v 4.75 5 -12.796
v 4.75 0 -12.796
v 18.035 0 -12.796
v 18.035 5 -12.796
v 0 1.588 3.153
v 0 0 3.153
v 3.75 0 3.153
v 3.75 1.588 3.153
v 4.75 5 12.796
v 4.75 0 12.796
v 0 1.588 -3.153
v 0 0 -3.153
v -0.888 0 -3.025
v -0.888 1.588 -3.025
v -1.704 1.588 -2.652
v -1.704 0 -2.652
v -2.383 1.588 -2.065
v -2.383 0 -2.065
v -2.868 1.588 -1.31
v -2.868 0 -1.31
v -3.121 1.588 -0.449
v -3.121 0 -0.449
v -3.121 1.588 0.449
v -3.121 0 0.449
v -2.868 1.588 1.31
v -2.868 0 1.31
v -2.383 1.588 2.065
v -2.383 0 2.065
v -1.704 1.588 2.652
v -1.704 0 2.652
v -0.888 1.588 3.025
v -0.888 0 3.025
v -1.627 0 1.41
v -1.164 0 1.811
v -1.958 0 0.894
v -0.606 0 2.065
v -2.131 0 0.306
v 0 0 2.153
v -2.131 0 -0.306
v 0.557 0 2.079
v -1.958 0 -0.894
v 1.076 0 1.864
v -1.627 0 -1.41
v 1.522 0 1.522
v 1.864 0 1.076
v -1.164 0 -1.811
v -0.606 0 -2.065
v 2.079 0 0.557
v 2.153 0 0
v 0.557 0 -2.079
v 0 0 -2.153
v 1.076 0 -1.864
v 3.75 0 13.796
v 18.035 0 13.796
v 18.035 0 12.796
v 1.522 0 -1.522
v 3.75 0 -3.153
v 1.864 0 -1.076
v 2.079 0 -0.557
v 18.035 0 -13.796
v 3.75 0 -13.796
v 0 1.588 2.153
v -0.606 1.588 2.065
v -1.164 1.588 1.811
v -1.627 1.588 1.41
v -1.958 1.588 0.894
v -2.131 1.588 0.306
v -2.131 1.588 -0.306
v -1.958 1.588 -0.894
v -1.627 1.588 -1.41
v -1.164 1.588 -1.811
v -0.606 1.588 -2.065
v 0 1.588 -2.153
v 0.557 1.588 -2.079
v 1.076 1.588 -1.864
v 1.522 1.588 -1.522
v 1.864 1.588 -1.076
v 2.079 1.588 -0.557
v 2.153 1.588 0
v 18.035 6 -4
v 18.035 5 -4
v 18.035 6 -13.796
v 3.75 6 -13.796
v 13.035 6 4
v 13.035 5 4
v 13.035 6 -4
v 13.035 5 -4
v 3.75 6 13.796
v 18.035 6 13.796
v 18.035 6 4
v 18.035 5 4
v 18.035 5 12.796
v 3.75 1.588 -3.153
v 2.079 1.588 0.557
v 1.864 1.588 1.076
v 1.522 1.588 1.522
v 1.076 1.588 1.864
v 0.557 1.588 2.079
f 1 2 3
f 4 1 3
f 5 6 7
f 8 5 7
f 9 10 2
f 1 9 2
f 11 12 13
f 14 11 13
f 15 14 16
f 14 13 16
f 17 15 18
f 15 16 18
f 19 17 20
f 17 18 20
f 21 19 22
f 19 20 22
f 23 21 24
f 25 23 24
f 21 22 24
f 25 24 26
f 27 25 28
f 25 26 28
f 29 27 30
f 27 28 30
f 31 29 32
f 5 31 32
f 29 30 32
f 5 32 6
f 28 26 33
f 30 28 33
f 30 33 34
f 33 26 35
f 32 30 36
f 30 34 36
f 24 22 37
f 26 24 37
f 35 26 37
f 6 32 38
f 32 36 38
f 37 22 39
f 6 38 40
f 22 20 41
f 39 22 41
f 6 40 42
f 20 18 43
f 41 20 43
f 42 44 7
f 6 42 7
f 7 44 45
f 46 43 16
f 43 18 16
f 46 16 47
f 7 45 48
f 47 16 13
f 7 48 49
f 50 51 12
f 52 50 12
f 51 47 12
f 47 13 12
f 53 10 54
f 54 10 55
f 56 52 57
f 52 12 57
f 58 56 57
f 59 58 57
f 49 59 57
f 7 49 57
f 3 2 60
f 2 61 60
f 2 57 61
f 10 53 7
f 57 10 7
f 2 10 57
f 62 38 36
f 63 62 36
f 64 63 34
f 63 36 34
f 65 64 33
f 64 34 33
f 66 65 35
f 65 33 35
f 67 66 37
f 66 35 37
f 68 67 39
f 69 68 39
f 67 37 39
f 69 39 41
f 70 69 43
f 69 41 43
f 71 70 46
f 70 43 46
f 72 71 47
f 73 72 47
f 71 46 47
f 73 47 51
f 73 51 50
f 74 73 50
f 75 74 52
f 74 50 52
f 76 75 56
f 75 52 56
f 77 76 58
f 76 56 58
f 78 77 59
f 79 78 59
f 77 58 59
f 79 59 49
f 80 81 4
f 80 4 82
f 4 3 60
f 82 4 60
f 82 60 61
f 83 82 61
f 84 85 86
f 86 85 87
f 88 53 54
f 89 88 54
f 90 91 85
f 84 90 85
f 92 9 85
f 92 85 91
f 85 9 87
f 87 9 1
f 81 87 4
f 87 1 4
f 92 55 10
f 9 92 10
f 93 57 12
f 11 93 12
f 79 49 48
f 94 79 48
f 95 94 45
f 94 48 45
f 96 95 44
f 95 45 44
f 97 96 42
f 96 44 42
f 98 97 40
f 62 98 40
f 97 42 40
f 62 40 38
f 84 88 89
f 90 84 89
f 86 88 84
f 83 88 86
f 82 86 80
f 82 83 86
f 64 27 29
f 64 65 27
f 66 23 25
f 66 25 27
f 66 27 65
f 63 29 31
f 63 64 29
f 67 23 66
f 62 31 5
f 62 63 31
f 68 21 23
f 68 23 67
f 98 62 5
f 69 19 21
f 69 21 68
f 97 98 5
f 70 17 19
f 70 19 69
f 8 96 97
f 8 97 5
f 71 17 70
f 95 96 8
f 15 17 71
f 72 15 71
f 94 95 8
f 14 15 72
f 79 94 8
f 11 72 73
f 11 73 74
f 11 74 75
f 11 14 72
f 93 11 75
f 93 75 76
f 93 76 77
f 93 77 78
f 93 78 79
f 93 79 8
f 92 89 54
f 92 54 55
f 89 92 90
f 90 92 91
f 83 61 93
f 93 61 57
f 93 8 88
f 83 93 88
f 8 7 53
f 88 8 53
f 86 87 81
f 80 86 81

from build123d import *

# Parameters (mm, degrees)
BOSS_EXTRUDE1_START = 5
BOSS_EXTRUDE1_DEPTH = 1
SKETCH1_4_W         = 1
SKETCH1_4_H         = 4.3053
BOSS_EXTRUDE2_DEPTH = 5
BOSS_EXTRUDE3_DEPTH = 1.5875


with BuildPart() as part:
    # Sketch1 → Boss-Extrude1 (new body)
    with BuildSketch(Plane(origin=(0, 0, 0), x_dir=(1, 0, 0), z_dir=(0, 1, 0)).offset(BOSS_EXTRUDE1_START)):
        Polygon((13.035, -4), (13.035, 4), (18.035, 4), (18.035, 13.796348116), (3.75, 13.796348116), (3.75, -13.796348116), (18.035, -13.796348116), (18.035, -4), align=None)
    extrude(amount=BOSS_EXTRUDE1_DEPTH)

    # Sketch1<4> → Boss-Extrude2 (add)
    with BuildSketch(Plane(origin=(0, 0, 0), x_dir=(1, 0, 0), z_dir=(0, 1, 0))):
        with Locations((4.25, 0)):
            Rectangle(SKETCH1_4_W, SKETCH1_4_H)
        Polygon((3.75, 3.15265), (3.75, 2.15265), (4.75, 2.15265), (4.75, 12.796348116), (17.035, 12.796348116), (18.035, 12.796348116), (18.035, 13.796348116), (3.75, 13.796348116), align=None)
        Polygon((4.75, -2.15265), (3.75, -2.15265), (3.75, -3.15265), (3.75, -13.796348116), (18.035, -13.796348116), (18.035, -12.796348116), (17.035, -12.796348116), (4.75, -12.796348116), align=None)
    extrude(amount=BOSS_EXTRUDE2_DEPTH)

    # Sketch1<5> → Boss-Extrude3 (add)
    with BuildSketch(Plane(origin=(0, 0, 0), x_dir=(1, 0, 0), z_dir=(0, 1, 0))):
        with BuildLine():
            Line((2.303323685, 2.15265), (3.75, 2.15265))
            Line((3.75, 2.15265), (3.75, 3.15265))
            Line((3.75, 3.15265), (0, 3.15265))
            ThreePointArc((0, 3.15265), (1.255517821, 2.891863936), (2.303323685, 2.15265))
        make_face()
        with BuildLine():
            Line((3.75, -2.15265), (3.75, 2.15265))
            Line((3.75, 2.15265), (2.303323685, 2.15265))
            ThreePointArc((2.303323685, 2.15265), (2.932641765, 1.157071434), (3.15265, 0))
            ThreePointArc((3.15265, 0), (2.932641765, -1.157071434), (2.303323685, -2.15265))
            Line((2.303323685, -2.15265), (3.75, -2.15265))
        make_face()
        with BuildLine():
            Line((3.75, -3.15265), (3.75, -2.15265))
            Line((3.75, -2.15265), (2.303323685, -2.15265))
            ThreePointArc((2.303323685, -2.15265), (1.255517821, -2.891863936), (0, -3.15265))
            Line((0, -3.15265), (3.75, -3.15265))
        make_face()
        with BuildLine():
            ThreePointArc((3.15265, 0), (2.932641765, 1.157071434), (2.303323685, 2.15265))
            Line((2.303323685, 2.15265), (0, 2.15265))
            ThreePointArc((0, 2.15265), (1.522153413, 1.522153413), (2.15265, 0))
            ThreePointArc((2.15265, 0), (1.522153413, -1.522153413), (0, -2.15265))
            Line((0, -2.15265), (2.303323685, -2.15265))
            ThreePointArc((2.303323685, -2.15265), (2.932641765, -1.157071434), (3.15265, 0))
        make_face()
        with BuildLine():
            ThreePointArc((0, -2.15265), (-2.15265, 0), (0, 2.15265))
            Line((0, 2.15265), (0, 3.15265))
            ThreePointArc((0, 3.15265), (-3.15265, 0), (0, -3.15265))
            Line((0, -3.15265), (0, -2.15265))
        make_face()
        with BuildLine():
            Line((0, 2.15265), (2.303323685, 2.15265))
            ThreePointArc((2.303323685, 2.15265), (1.255517821, 2.891863936), (0, 3.15265))
            Line((0, 3.15265), (0, 2.15265))
        make_face()
        with BuildLine():
            ThreePointArc((0, -3.15265), (1.255517821, -2.891863936), (2.303323685, -2.15265))
            Line((2.303323685, -2.15265), (0, -2.15265))
            Line((0, -2.15265), (0, -3.15265))
        make_face()
    extrude(amount=BOSS_EXTRUDE3_DEPTH)


solid = part.part
